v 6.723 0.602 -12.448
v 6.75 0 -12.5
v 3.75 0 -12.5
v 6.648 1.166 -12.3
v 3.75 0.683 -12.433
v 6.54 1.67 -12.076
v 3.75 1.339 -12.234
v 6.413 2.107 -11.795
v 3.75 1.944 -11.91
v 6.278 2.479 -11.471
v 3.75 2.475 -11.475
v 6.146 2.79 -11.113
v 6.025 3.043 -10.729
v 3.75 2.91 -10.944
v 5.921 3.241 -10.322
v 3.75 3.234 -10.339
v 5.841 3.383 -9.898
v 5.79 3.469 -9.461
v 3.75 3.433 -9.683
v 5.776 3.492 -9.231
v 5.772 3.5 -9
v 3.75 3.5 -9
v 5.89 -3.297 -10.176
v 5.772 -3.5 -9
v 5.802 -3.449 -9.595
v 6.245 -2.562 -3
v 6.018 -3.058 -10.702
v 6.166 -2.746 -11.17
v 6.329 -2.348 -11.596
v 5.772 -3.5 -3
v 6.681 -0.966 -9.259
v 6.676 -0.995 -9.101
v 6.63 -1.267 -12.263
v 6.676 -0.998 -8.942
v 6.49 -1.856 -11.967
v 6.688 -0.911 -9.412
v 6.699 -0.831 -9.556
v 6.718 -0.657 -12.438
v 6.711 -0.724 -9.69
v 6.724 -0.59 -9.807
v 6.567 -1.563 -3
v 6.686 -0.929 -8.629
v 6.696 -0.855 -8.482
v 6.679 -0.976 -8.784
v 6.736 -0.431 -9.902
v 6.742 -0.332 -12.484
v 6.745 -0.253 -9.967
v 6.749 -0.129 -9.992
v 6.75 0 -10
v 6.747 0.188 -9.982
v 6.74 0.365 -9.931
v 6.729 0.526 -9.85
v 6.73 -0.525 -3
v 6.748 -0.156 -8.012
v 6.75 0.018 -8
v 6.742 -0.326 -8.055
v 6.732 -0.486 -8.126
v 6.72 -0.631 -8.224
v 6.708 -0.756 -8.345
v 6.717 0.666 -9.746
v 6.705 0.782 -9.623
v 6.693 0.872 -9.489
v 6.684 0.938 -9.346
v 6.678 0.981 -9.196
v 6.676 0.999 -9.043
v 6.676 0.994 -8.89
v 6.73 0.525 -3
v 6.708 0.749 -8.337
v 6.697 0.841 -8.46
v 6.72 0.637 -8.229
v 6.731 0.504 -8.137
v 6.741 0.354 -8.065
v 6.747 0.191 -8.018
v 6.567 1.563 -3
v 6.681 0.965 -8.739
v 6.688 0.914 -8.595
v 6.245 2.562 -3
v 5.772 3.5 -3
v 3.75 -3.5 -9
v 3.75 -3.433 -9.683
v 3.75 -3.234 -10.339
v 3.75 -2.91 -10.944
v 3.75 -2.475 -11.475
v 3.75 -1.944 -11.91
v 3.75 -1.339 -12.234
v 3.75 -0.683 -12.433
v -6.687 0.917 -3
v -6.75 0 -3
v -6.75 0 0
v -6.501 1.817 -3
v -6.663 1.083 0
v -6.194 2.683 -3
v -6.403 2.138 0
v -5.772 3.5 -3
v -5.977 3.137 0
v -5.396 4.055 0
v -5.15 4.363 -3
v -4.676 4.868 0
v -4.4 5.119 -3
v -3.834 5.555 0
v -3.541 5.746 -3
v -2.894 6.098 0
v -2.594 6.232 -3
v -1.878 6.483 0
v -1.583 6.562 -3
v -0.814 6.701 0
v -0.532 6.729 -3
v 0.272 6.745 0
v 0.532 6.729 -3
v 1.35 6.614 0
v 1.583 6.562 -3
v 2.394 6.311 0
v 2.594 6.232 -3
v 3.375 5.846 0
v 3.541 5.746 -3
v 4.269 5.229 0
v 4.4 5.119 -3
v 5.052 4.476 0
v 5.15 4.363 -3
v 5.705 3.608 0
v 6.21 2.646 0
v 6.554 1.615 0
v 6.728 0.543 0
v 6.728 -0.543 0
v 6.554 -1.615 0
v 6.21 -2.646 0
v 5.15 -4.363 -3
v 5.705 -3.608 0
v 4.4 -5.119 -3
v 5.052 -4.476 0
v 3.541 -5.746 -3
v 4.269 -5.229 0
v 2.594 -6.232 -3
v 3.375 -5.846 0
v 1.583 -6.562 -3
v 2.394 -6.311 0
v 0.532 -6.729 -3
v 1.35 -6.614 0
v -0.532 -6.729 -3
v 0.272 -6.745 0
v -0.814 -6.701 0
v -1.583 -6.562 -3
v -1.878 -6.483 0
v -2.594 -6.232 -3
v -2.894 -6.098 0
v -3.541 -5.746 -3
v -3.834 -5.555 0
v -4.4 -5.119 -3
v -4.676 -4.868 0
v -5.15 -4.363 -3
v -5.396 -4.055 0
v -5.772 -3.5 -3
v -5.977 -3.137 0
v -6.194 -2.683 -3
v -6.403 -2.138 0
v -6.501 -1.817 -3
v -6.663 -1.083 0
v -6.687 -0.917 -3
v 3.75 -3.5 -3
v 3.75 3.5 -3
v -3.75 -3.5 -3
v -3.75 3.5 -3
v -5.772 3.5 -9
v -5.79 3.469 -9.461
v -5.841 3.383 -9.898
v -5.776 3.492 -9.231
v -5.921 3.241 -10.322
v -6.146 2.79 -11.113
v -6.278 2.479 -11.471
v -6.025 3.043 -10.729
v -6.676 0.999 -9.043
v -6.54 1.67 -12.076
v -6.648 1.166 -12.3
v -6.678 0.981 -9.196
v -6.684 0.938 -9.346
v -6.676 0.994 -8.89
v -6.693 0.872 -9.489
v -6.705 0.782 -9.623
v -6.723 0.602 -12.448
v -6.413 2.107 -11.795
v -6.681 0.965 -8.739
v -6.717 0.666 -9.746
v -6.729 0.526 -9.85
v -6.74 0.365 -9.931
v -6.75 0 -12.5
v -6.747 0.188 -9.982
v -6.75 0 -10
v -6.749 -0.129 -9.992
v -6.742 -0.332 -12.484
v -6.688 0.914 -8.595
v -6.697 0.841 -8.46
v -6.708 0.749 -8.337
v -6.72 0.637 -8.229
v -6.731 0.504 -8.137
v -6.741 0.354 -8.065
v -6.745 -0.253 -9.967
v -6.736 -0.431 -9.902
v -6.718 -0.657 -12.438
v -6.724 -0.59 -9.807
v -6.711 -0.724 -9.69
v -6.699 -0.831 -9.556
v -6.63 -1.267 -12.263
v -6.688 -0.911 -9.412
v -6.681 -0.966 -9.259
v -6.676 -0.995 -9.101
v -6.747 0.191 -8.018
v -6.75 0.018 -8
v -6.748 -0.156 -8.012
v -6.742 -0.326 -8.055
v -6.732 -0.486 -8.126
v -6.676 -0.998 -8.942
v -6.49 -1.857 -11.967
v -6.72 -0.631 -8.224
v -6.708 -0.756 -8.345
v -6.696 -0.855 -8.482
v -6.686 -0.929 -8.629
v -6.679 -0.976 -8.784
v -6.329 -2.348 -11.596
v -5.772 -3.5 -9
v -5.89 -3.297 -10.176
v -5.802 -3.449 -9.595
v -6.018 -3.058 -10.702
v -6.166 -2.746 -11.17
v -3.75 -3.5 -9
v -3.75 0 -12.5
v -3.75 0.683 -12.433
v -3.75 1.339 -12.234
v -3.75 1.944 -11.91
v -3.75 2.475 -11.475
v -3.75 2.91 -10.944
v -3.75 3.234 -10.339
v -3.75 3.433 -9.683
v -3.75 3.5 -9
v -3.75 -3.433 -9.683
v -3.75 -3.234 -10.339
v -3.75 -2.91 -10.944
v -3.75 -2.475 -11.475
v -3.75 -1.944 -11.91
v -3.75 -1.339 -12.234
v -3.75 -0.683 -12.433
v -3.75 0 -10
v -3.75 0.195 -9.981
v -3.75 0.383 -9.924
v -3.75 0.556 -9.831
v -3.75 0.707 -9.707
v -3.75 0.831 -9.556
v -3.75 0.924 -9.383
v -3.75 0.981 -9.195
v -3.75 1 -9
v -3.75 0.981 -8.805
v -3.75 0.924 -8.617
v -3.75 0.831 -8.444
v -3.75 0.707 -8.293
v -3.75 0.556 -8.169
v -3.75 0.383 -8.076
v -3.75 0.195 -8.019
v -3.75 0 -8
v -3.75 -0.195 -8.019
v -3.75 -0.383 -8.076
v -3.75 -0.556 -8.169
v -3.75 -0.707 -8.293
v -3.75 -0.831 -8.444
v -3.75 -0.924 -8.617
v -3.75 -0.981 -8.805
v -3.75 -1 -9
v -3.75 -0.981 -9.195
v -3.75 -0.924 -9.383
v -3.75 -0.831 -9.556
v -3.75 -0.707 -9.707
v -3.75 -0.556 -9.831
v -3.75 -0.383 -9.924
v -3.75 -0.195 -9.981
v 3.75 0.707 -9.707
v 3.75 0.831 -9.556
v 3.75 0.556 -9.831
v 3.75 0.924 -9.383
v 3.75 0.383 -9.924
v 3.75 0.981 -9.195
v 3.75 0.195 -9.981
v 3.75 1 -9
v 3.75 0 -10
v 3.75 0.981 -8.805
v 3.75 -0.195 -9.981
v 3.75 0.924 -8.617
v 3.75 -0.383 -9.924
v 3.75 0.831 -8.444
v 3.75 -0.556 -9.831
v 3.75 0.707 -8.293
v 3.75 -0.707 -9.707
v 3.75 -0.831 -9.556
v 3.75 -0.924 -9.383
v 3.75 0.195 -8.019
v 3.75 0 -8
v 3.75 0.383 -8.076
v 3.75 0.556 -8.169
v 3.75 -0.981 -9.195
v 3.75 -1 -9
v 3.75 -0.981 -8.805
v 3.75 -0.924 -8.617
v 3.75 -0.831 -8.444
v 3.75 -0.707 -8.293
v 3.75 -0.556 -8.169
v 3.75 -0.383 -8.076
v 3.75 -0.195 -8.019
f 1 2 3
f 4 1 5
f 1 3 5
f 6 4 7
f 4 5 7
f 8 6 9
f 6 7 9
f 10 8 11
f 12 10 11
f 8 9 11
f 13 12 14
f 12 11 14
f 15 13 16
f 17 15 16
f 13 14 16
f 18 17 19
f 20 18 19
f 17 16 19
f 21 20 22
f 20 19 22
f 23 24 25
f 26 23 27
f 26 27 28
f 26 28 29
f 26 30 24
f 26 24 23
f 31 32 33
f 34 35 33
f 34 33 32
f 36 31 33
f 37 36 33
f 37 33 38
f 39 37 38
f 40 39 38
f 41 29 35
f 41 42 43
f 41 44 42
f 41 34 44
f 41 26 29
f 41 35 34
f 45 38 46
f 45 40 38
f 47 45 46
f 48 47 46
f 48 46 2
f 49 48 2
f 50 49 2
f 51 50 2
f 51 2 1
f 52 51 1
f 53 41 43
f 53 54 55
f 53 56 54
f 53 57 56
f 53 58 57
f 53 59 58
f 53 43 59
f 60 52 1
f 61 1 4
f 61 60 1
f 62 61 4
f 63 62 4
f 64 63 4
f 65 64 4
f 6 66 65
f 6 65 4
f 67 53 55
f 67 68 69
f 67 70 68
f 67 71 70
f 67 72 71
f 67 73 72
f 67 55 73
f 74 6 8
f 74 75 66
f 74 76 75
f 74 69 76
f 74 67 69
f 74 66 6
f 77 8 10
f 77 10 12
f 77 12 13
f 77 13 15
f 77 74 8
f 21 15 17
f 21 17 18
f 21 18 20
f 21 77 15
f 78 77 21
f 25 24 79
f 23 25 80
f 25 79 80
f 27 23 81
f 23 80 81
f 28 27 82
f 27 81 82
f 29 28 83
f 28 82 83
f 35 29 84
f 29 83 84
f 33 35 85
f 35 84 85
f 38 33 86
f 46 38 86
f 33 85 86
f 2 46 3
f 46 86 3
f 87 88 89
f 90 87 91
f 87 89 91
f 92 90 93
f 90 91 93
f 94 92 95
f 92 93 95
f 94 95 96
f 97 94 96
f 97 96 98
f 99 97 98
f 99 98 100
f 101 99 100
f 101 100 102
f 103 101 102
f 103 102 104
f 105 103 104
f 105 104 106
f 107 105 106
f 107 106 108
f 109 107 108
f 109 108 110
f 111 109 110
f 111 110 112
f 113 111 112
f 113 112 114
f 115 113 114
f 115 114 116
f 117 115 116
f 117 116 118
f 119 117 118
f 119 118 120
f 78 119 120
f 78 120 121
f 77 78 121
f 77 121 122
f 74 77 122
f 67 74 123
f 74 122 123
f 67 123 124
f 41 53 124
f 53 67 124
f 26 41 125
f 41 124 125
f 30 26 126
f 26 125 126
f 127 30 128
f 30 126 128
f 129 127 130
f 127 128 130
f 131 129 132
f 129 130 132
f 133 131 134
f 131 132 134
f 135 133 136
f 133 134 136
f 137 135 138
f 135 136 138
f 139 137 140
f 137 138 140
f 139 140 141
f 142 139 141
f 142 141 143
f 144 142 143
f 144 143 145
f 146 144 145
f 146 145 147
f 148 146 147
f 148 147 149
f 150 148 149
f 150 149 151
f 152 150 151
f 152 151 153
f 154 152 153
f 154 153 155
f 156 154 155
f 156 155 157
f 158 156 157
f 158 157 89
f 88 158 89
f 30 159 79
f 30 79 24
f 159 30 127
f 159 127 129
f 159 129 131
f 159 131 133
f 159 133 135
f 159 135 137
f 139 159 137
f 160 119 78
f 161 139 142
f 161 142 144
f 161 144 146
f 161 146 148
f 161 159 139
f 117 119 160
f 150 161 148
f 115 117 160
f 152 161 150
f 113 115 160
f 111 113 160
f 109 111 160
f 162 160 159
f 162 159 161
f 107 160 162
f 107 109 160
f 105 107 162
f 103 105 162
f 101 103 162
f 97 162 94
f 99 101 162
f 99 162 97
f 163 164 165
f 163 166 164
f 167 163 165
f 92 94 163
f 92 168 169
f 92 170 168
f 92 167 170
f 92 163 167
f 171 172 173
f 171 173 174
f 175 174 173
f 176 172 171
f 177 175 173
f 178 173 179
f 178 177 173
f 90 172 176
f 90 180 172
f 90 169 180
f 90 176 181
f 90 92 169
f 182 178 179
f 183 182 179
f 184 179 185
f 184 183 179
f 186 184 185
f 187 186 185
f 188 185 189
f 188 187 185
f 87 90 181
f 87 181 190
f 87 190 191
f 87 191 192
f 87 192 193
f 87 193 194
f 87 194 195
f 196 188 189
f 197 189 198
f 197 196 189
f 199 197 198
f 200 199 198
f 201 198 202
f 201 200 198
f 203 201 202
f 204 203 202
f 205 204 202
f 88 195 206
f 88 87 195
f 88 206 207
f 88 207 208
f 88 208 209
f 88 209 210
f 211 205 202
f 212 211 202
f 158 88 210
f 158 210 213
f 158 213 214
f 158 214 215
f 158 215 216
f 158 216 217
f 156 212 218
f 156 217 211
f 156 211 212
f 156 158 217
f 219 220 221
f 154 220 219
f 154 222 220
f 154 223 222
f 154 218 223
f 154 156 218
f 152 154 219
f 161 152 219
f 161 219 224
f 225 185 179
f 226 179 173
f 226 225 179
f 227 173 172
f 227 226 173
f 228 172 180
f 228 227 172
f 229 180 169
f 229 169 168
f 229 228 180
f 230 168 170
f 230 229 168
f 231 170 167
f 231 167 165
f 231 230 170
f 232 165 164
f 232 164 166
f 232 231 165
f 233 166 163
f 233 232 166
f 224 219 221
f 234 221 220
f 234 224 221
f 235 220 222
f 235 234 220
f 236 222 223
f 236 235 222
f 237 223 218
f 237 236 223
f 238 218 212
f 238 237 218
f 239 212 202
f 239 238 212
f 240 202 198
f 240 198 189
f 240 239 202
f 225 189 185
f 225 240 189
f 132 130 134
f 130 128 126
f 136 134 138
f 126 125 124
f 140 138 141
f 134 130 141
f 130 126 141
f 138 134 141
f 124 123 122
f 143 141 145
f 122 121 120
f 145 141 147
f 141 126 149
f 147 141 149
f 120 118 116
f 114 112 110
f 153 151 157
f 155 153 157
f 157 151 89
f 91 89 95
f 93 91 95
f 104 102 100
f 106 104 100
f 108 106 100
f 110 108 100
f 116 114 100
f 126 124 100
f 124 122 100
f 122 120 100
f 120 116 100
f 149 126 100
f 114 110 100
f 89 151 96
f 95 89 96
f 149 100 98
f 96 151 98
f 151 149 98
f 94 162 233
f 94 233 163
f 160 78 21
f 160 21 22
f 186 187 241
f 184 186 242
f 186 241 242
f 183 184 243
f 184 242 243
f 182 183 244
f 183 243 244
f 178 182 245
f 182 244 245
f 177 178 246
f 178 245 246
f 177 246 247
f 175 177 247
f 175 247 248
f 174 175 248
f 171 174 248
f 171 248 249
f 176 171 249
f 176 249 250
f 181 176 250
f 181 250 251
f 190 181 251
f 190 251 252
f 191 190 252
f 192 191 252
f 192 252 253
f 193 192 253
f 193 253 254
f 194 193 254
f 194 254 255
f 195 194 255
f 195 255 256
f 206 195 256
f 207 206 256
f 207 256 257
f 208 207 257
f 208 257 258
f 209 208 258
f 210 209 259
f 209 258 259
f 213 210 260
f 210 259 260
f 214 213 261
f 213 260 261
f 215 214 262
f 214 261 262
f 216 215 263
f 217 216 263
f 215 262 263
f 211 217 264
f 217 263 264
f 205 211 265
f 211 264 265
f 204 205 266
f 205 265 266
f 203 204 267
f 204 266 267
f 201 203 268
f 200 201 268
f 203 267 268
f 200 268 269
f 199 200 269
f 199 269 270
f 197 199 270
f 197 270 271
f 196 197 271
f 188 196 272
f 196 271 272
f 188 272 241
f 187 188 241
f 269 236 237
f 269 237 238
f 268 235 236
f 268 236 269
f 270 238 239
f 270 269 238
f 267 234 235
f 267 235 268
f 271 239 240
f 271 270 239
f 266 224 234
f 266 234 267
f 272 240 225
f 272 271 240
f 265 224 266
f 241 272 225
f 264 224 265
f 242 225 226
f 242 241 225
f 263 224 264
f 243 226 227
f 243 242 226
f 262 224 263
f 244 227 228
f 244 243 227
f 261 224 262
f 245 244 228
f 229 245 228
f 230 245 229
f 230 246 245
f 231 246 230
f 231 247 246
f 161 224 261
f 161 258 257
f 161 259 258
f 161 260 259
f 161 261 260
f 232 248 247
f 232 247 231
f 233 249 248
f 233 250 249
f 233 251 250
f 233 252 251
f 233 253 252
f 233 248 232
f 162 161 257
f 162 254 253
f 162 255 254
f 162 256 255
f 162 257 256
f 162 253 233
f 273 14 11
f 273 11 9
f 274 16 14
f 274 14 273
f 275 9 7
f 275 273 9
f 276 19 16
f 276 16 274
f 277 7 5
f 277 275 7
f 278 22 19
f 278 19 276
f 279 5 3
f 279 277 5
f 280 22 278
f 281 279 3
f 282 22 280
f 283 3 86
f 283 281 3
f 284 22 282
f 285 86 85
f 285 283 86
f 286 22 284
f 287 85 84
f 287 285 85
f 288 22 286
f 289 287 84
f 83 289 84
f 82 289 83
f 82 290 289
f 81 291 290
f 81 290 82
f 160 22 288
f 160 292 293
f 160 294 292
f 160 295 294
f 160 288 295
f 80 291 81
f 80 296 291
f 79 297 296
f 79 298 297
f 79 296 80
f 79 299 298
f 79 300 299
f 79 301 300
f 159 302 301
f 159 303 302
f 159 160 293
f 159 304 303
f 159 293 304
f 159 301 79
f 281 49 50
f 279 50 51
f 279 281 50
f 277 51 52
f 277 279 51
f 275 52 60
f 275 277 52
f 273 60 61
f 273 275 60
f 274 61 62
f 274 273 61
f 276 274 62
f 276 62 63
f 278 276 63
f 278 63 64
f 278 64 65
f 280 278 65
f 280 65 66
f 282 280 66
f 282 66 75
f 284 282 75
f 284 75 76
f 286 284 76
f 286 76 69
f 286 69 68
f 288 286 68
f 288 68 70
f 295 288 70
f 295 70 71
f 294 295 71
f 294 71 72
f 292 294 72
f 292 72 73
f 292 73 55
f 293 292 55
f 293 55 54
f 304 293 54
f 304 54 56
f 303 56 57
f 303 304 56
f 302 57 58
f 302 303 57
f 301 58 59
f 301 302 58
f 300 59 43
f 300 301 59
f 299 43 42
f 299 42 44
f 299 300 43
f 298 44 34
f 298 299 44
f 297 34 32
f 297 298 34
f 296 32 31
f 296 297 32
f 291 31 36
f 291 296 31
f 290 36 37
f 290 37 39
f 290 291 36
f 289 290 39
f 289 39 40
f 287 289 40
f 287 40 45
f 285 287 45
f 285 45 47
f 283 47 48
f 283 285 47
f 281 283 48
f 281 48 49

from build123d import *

# Parameters (mm, degrees)
SKETCH2_R                = 6.75
U_JOINT_BASE_DEPTH       = 3
U_JOINT_STANDUPS_DEPTH   = 9.5
STANDUP_ROUND_DEPTH      = 7.75
STANDUP_ROUND_DEPTH_BACK = 7.75
SKETCH5_R                = 1
BALL_HOLES_DEPTH         = 7.75
BALL_HOLES_DEPTH_BACK    = 7.75


with BuildPart() as part:
    # Sketch2 → U Joint Base (new body)
    with BuildSketch(Plane(origin=(0, 0, 0), x_dir=(-1, 0, 0), z_dir=(0, 0, -1))):
        Circle(SKETCH2_R)
    extrude(amount=U_JOINT_BASE_DEPTH)

    # Sketch3 → U Joint Standups (add)
    with BuildSketch(Plane(origin=(0, 0, -3), x_dir=(-1, 0, 0), z_dir=(0, 0, -1))):
        with BuildLine():
            Line((-5.771698, 3.5), (-3.75, 3.5))
            Line((-3.75, 3.5), (-3.75, -3.5))
            Line((-3.75, -3.5), (-5.771698, -3.5))
            ThreePointArc((-5.771698, -3.5), (-6.75, 0), (-5.771698, 3.5))
        make_face()
        with BuildLine():
            Line((3.75, -3.5), (3.75, 3.5))
            Line((3.75, 3.5), (5.771698, 3.5))
            ThreePointArc((5.771698, 3.5), (6.75, 0), (5.771698, -3.5))
            Line((5.771698, -3.5), (3.75, -3.5))
        make_face()
    extrude(amount=U_JOINT_STANDUPS_DEPTH)

    # Sketch4 → Standup Round (cut, two sides)
    with BuildSketch(Plane(origin=(0, 0, 0), x_dir=(0, 0, -1), z_dir=(1, 0, 0))) as standup_round_sk:
        with BuildLine():
            ThreePointArc((9, -3.5), (11.474874, -2.474874), (12.5, 0))
            Line((12.5, 0), (12.5, -3.5))
            Line((12.5, -3.5), (9, -3.5))
        make_face()
        with BuildLine():
            ThreePointArc((12.5, 0), (11.474874, 2.474874), (9, 3.5))
            Line((9, 3.5), (12.5, 3.5))
            Line((12.5, 3.5), (12.5, 0))
        make_face()
    extrude(amount=STANDUP_ROUND_DEPTH, mode=Mode.SUBTRACT)
    extrude(standup_round_sk.sketch, amount=-STANDUP_ROUND_DEPTH_BACK, mode=Mode.SUBTRACT)

    # Sketch5 → Ball Holes (cut, two sides)
    with BuildSketch(Plane(origin=(0, 0, 0), x_dir=(0, 0, -1), z_dir=(1, 0, 0))) as ball_holes_sk:
        with Locations((9, 0)):
            Circle(SKETCH5_R)
    extrude(amount=BALL_HOLES_DEPTH, mode=Mode.SUBTRACT)
    extrude(ball_holes_sk.sketch, amount=-BALL_HOLES_DEPTH_BACK, mode=Mode.SUBTRACT)


solid = part.part
